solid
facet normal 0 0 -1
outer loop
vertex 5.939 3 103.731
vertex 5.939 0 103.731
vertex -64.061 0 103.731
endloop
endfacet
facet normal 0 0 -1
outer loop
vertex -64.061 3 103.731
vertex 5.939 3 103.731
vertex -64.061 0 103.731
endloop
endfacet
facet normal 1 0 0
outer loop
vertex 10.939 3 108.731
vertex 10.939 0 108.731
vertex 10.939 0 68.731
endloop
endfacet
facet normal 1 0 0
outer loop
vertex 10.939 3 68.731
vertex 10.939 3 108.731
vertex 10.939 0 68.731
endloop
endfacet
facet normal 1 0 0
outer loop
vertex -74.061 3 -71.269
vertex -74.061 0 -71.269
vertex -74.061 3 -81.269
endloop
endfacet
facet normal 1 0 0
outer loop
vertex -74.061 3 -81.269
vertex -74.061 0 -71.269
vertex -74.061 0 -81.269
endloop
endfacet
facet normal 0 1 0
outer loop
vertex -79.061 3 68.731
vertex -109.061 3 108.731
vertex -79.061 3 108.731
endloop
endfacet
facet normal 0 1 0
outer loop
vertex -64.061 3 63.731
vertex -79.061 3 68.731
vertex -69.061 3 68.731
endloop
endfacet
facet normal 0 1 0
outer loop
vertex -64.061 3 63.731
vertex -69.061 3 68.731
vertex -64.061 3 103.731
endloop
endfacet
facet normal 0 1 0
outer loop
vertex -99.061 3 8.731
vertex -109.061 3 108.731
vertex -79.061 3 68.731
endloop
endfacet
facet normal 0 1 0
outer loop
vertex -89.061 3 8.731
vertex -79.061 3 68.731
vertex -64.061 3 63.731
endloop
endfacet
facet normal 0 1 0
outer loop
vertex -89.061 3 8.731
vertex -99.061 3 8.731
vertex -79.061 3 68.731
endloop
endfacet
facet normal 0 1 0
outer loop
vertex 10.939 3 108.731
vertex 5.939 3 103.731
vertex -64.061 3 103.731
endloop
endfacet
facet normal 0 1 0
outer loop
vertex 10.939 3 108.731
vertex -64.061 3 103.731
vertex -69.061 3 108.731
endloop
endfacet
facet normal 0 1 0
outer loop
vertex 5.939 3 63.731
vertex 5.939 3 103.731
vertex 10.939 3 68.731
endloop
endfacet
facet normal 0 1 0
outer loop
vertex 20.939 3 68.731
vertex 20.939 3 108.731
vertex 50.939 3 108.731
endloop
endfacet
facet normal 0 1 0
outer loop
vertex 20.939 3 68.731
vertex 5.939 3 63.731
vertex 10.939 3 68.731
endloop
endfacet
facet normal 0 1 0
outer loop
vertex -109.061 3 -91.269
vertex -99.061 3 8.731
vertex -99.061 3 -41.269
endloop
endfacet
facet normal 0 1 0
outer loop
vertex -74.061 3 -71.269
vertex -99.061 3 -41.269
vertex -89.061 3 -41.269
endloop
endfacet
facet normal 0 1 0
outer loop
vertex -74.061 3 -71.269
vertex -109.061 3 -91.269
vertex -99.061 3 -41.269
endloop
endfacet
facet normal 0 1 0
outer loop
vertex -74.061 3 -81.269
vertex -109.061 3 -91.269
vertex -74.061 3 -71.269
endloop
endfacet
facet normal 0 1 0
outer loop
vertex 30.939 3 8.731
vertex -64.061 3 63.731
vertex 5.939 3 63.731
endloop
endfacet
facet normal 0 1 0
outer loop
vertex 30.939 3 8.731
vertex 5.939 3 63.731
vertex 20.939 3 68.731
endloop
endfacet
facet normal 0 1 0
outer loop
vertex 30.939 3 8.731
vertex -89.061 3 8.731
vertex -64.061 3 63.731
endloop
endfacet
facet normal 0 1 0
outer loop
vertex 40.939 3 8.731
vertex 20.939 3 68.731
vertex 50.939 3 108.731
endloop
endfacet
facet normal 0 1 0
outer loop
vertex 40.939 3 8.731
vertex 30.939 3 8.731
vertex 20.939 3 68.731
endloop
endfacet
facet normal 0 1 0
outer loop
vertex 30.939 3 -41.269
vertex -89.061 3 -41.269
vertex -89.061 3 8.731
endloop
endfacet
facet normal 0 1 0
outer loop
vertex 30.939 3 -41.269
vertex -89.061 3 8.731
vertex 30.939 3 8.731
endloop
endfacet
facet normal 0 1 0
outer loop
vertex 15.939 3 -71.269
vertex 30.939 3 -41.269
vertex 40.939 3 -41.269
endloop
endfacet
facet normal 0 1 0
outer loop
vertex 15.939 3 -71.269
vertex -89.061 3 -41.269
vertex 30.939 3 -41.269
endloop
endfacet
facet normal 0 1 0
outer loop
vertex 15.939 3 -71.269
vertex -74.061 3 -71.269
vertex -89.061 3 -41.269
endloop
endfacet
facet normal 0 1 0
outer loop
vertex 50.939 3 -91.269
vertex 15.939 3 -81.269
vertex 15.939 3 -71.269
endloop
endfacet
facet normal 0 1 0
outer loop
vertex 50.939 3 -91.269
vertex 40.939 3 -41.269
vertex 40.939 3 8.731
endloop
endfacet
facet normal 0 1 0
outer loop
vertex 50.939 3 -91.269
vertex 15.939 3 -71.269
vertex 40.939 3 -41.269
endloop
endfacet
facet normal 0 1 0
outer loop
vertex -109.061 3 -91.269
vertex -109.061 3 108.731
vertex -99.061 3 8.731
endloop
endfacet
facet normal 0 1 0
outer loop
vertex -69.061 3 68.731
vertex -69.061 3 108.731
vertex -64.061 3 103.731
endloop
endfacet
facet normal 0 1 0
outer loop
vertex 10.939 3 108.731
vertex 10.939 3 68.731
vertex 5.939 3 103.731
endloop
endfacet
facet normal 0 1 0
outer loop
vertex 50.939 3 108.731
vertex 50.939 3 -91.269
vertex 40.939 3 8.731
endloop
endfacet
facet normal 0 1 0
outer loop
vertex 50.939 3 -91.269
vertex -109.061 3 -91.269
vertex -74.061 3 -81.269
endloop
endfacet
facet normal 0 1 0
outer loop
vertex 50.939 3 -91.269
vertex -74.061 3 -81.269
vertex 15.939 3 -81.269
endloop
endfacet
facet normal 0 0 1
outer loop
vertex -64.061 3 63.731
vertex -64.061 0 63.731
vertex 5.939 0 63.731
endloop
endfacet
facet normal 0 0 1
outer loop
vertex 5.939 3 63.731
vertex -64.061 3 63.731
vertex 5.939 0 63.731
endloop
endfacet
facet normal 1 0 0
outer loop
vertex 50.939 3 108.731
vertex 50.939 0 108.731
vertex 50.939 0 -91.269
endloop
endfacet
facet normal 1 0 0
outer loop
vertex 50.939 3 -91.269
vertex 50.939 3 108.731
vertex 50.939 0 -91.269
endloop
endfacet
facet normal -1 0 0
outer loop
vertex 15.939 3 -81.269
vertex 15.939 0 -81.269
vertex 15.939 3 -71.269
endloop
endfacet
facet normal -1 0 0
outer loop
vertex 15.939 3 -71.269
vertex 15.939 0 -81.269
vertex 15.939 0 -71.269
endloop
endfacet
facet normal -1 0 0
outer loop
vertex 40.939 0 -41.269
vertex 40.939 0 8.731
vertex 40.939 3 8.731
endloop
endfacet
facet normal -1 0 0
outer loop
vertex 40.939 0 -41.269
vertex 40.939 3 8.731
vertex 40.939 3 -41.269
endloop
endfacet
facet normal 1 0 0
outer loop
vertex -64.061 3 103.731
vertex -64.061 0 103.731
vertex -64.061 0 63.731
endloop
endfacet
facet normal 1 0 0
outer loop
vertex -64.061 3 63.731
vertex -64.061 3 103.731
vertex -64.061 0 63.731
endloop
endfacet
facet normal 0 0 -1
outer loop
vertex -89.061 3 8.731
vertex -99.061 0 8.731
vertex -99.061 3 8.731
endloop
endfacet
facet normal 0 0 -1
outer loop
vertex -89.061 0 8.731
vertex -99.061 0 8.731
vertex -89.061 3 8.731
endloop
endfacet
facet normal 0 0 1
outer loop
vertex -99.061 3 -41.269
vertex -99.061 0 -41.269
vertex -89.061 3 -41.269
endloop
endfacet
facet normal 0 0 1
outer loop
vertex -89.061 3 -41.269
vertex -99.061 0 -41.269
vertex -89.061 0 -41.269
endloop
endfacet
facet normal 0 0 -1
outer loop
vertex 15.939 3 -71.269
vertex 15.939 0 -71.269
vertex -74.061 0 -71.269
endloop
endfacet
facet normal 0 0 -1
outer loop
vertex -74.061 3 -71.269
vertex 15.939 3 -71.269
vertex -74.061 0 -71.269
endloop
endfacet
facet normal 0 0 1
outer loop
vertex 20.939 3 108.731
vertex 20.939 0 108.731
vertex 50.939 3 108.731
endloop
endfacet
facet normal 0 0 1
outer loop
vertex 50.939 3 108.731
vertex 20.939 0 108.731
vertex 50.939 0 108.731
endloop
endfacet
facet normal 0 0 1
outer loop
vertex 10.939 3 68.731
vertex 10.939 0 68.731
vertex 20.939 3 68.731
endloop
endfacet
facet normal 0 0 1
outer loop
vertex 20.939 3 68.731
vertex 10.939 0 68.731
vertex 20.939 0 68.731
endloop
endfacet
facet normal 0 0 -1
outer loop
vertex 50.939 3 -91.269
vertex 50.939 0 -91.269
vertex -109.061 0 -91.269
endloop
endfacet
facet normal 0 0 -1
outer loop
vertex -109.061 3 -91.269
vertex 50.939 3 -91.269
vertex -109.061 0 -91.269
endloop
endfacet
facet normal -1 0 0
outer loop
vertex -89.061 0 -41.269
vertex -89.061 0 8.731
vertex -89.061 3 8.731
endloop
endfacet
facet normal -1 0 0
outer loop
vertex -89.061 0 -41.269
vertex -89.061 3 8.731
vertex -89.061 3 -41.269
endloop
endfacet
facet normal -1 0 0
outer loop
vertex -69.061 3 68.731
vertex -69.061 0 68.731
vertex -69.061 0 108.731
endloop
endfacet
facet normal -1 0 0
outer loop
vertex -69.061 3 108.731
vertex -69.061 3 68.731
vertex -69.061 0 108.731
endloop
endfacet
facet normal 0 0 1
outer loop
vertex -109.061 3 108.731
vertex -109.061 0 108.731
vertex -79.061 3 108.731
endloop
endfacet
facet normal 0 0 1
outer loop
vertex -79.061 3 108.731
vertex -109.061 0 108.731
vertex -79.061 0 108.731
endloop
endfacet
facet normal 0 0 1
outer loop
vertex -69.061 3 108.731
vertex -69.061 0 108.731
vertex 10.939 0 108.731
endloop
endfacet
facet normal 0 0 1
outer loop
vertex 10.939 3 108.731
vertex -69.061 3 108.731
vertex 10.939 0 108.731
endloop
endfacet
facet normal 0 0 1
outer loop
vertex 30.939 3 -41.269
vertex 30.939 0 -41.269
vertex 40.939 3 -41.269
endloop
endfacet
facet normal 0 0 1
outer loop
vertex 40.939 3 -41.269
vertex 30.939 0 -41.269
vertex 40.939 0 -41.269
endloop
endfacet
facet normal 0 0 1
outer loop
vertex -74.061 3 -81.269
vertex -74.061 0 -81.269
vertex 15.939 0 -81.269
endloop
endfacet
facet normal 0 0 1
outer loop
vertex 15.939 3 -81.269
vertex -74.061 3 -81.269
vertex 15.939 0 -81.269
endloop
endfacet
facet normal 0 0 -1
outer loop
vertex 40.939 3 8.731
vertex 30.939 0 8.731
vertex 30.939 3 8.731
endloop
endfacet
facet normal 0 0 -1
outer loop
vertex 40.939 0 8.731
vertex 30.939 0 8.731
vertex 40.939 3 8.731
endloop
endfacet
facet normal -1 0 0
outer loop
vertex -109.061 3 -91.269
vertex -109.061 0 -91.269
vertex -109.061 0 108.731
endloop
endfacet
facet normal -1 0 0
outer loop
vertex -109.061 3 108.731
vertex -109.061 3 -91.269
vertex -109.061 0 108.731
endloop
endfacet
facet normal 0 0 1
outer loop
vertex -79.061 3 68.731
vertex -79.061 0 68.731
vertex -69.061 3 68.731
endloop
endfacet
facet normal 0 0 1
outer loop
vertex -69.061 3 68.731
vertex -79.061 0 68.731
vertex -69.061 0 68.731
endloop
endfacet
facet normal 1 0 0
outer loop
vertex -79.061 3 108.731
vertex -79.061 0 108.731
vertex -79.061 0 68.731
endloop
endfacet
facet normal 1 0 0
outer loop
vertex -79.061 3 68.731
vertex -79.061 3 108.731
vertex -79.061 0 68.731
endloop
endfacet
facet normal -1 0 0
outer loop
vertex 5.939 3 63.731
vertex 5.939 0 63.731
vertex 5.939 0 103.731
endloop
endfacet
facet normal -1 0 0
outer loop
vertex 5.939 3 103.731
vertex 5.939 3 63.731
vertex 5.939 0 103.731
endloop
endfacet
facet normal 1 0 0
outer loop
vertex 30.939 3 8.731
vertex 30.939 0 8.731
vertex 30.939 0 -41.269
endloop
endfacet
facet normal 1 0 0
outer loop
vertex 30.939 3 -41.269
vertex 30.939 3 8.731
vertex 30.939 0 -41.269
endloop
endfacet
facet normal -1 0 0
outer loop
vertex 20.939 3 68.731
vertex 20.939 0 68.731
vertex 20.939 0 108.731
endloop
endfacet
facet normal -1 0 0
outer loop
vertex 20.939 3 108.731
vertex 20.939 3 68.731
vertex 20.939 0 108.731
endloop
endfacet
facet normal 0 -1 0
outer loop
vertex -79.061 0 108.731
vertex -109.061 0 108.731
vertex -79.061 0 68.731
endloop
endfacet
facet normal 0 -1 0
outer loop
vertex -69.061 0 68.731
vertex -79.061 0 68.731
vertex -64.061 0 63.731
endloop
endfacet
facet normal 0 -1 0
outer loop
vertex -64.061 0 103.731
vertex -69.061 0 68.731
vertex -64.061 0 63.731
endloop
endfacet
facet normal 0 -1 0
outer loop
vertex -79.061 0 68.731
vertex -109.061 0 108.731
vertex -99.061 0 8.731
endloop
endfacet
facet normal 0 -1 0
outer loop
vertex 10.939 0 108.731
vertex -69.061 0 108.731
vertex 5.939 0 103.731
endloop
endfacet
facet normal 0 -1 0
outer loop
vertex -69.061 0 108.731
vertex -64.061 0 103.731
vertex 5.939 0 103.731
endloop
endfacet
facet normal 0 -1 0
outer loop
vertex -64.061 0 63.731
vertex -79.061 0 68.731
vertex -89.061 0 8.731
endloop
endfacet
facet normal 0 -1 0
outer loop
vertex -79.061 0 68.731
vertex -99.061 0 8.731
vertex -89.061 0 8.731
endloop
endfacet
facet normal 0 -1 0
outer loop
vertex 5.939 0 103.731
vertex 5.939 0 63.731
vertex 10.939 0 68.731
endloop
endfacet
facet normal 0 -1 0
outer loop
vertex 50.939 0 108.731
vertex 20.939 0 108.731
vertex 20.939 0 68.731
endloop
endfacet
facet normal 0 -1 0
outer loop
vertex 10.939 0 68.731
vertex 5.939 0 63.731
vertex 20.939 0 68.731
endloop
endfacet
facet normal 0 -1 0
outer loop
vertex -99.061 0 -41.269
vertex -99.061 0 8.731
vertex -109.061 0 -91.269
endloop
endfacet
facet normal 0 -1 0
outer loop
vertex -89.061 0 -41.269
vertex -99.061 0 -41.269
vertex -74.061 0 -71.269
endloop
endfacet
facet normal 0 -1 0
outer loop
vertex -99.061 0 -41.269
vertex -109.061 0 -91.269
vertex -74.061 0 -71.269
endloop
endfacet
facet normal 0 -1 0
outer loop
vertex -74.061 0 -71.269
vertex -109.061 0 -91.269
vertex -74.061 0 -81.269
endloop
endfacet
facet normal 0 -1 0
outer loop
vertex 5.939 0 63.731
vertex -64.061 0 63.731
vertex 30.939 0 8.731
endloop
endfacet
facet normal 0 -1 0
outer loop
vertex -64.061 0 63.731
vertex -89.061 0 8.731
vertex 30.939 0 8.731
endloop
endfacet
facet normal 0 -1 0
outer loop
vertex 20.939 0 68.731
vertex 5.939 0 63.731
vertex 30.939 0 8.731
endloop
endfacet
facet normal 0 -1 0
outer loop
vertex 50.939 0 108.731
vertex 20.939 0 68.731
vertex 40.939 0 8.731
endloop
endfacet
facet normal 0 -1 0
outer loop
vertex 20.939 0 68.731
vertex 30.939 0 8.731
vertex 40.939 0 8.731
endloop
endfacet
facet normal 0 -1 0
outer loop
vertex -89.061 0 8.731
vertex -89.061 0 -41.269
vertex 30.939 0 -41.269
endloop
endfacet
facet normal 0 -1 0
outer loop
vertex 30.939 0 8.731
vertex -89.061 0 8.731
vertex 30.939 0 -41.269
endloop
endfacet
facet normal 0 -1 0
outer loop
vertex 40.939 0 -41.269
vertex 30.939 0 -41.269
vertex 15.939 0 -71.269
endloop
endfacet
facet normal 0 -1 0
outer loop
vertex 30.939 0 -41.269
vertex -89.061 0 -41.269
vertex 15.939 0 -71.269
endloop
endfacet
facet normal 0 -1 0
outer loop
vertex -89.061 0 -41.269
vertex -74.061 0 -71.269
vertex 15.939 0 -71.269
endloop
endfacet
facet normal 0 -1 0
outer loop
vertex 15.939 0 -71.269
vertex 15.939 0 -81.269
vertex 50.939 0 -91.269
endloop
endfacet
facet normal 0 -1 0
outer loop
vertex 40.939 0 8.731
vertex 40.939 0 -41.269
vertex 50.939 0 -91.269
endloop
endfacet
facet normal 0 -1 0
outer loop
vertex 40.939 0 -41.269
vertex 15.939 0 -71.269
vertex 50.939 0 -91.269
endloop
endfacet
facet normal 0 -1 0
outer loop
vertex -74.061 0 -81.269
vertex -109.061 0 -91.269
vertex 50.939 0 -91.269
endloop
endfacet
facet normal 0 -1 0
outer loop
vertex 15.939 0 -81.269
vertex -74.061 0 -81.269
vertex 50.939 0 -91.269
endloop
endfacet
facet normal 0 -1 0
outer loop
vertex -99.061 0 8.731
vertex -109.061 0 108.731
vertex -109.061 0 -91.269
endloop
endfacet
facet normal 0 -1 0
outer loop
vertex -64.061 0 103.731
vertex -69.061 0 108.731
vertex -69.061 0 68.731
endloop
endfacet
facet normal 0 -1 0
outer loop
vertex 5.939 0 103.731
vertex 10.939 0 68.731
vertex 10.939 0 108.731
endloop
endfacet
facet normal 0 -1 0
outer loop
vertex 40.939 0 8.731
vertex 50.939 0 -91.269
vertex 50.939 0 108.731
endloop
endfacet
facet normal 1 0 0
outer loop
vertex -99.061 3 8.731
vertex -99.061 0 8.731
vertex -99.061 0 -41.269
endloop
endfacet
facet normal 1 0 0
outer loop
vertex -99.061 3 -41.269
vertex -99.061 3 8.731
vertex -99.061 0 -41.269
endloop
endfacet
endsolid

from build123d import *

# Parameters (mm, degrees)
SKETCH1_W           = 70
SKETCH1_H           = 40
SKETCH1_W_2         = 90
SKETCH1_H_2         = 10
SKETCH1_W_3         = 10
SKETCH1_H_3         = 50
BOSS_EXTRUDE1_DEPTH = 3


with BuildPart() as part:
    # Sketch1 → Boss-Extrude1 (new body)
    with BuildSketch(Plane(origin=(0, 0, 0), x_dir=(1, 0, 0), z_dir=(0, 1, 0))):
        Polygon((50.939044481, 91.268533773), (-109.060955519, 91.268533773), (-109.060955519, -108.731466227), (-79.060955519, -108.731466227), (-79.060955519, -68.731466227), (-69.060955519, -68.731466227), (-69.060955519, -108.731466227), (10.939044481, -108.731466227), (10.939044481, -68.731466227), (20.939044481, -68.731466227), (20.939044481, -108.731466227), (50.939044481, -108.731466227), align=None)
        with Locations((-29.060955519, -83.731466227)):
            Rectangle(SKETCH1_W, SKETCH1_H, mode=Mode.SUBTRACT)
        with Locations((-29.060955519, 76.268533773)):
            Rectangle(SKETCH1_W_2, SKETCH1_H_2, mode=Mode.SUBTRACT)
        with Locations((35.939044481, 16.268533773)):
            Rectangle(SKETCH1_W_3, SKETCH1_H_3, mode=Mode.SUBTRACT)
        with Locations((-94.060955519, 16.268533773)):
            Rectangle(SKETCH1_W_3, SKETCH1_H_3, mode=Mode.SUBTRACT)
    extrude(amount=BOSS_EXTRUDE1_DEPTH)


solid = part.part
